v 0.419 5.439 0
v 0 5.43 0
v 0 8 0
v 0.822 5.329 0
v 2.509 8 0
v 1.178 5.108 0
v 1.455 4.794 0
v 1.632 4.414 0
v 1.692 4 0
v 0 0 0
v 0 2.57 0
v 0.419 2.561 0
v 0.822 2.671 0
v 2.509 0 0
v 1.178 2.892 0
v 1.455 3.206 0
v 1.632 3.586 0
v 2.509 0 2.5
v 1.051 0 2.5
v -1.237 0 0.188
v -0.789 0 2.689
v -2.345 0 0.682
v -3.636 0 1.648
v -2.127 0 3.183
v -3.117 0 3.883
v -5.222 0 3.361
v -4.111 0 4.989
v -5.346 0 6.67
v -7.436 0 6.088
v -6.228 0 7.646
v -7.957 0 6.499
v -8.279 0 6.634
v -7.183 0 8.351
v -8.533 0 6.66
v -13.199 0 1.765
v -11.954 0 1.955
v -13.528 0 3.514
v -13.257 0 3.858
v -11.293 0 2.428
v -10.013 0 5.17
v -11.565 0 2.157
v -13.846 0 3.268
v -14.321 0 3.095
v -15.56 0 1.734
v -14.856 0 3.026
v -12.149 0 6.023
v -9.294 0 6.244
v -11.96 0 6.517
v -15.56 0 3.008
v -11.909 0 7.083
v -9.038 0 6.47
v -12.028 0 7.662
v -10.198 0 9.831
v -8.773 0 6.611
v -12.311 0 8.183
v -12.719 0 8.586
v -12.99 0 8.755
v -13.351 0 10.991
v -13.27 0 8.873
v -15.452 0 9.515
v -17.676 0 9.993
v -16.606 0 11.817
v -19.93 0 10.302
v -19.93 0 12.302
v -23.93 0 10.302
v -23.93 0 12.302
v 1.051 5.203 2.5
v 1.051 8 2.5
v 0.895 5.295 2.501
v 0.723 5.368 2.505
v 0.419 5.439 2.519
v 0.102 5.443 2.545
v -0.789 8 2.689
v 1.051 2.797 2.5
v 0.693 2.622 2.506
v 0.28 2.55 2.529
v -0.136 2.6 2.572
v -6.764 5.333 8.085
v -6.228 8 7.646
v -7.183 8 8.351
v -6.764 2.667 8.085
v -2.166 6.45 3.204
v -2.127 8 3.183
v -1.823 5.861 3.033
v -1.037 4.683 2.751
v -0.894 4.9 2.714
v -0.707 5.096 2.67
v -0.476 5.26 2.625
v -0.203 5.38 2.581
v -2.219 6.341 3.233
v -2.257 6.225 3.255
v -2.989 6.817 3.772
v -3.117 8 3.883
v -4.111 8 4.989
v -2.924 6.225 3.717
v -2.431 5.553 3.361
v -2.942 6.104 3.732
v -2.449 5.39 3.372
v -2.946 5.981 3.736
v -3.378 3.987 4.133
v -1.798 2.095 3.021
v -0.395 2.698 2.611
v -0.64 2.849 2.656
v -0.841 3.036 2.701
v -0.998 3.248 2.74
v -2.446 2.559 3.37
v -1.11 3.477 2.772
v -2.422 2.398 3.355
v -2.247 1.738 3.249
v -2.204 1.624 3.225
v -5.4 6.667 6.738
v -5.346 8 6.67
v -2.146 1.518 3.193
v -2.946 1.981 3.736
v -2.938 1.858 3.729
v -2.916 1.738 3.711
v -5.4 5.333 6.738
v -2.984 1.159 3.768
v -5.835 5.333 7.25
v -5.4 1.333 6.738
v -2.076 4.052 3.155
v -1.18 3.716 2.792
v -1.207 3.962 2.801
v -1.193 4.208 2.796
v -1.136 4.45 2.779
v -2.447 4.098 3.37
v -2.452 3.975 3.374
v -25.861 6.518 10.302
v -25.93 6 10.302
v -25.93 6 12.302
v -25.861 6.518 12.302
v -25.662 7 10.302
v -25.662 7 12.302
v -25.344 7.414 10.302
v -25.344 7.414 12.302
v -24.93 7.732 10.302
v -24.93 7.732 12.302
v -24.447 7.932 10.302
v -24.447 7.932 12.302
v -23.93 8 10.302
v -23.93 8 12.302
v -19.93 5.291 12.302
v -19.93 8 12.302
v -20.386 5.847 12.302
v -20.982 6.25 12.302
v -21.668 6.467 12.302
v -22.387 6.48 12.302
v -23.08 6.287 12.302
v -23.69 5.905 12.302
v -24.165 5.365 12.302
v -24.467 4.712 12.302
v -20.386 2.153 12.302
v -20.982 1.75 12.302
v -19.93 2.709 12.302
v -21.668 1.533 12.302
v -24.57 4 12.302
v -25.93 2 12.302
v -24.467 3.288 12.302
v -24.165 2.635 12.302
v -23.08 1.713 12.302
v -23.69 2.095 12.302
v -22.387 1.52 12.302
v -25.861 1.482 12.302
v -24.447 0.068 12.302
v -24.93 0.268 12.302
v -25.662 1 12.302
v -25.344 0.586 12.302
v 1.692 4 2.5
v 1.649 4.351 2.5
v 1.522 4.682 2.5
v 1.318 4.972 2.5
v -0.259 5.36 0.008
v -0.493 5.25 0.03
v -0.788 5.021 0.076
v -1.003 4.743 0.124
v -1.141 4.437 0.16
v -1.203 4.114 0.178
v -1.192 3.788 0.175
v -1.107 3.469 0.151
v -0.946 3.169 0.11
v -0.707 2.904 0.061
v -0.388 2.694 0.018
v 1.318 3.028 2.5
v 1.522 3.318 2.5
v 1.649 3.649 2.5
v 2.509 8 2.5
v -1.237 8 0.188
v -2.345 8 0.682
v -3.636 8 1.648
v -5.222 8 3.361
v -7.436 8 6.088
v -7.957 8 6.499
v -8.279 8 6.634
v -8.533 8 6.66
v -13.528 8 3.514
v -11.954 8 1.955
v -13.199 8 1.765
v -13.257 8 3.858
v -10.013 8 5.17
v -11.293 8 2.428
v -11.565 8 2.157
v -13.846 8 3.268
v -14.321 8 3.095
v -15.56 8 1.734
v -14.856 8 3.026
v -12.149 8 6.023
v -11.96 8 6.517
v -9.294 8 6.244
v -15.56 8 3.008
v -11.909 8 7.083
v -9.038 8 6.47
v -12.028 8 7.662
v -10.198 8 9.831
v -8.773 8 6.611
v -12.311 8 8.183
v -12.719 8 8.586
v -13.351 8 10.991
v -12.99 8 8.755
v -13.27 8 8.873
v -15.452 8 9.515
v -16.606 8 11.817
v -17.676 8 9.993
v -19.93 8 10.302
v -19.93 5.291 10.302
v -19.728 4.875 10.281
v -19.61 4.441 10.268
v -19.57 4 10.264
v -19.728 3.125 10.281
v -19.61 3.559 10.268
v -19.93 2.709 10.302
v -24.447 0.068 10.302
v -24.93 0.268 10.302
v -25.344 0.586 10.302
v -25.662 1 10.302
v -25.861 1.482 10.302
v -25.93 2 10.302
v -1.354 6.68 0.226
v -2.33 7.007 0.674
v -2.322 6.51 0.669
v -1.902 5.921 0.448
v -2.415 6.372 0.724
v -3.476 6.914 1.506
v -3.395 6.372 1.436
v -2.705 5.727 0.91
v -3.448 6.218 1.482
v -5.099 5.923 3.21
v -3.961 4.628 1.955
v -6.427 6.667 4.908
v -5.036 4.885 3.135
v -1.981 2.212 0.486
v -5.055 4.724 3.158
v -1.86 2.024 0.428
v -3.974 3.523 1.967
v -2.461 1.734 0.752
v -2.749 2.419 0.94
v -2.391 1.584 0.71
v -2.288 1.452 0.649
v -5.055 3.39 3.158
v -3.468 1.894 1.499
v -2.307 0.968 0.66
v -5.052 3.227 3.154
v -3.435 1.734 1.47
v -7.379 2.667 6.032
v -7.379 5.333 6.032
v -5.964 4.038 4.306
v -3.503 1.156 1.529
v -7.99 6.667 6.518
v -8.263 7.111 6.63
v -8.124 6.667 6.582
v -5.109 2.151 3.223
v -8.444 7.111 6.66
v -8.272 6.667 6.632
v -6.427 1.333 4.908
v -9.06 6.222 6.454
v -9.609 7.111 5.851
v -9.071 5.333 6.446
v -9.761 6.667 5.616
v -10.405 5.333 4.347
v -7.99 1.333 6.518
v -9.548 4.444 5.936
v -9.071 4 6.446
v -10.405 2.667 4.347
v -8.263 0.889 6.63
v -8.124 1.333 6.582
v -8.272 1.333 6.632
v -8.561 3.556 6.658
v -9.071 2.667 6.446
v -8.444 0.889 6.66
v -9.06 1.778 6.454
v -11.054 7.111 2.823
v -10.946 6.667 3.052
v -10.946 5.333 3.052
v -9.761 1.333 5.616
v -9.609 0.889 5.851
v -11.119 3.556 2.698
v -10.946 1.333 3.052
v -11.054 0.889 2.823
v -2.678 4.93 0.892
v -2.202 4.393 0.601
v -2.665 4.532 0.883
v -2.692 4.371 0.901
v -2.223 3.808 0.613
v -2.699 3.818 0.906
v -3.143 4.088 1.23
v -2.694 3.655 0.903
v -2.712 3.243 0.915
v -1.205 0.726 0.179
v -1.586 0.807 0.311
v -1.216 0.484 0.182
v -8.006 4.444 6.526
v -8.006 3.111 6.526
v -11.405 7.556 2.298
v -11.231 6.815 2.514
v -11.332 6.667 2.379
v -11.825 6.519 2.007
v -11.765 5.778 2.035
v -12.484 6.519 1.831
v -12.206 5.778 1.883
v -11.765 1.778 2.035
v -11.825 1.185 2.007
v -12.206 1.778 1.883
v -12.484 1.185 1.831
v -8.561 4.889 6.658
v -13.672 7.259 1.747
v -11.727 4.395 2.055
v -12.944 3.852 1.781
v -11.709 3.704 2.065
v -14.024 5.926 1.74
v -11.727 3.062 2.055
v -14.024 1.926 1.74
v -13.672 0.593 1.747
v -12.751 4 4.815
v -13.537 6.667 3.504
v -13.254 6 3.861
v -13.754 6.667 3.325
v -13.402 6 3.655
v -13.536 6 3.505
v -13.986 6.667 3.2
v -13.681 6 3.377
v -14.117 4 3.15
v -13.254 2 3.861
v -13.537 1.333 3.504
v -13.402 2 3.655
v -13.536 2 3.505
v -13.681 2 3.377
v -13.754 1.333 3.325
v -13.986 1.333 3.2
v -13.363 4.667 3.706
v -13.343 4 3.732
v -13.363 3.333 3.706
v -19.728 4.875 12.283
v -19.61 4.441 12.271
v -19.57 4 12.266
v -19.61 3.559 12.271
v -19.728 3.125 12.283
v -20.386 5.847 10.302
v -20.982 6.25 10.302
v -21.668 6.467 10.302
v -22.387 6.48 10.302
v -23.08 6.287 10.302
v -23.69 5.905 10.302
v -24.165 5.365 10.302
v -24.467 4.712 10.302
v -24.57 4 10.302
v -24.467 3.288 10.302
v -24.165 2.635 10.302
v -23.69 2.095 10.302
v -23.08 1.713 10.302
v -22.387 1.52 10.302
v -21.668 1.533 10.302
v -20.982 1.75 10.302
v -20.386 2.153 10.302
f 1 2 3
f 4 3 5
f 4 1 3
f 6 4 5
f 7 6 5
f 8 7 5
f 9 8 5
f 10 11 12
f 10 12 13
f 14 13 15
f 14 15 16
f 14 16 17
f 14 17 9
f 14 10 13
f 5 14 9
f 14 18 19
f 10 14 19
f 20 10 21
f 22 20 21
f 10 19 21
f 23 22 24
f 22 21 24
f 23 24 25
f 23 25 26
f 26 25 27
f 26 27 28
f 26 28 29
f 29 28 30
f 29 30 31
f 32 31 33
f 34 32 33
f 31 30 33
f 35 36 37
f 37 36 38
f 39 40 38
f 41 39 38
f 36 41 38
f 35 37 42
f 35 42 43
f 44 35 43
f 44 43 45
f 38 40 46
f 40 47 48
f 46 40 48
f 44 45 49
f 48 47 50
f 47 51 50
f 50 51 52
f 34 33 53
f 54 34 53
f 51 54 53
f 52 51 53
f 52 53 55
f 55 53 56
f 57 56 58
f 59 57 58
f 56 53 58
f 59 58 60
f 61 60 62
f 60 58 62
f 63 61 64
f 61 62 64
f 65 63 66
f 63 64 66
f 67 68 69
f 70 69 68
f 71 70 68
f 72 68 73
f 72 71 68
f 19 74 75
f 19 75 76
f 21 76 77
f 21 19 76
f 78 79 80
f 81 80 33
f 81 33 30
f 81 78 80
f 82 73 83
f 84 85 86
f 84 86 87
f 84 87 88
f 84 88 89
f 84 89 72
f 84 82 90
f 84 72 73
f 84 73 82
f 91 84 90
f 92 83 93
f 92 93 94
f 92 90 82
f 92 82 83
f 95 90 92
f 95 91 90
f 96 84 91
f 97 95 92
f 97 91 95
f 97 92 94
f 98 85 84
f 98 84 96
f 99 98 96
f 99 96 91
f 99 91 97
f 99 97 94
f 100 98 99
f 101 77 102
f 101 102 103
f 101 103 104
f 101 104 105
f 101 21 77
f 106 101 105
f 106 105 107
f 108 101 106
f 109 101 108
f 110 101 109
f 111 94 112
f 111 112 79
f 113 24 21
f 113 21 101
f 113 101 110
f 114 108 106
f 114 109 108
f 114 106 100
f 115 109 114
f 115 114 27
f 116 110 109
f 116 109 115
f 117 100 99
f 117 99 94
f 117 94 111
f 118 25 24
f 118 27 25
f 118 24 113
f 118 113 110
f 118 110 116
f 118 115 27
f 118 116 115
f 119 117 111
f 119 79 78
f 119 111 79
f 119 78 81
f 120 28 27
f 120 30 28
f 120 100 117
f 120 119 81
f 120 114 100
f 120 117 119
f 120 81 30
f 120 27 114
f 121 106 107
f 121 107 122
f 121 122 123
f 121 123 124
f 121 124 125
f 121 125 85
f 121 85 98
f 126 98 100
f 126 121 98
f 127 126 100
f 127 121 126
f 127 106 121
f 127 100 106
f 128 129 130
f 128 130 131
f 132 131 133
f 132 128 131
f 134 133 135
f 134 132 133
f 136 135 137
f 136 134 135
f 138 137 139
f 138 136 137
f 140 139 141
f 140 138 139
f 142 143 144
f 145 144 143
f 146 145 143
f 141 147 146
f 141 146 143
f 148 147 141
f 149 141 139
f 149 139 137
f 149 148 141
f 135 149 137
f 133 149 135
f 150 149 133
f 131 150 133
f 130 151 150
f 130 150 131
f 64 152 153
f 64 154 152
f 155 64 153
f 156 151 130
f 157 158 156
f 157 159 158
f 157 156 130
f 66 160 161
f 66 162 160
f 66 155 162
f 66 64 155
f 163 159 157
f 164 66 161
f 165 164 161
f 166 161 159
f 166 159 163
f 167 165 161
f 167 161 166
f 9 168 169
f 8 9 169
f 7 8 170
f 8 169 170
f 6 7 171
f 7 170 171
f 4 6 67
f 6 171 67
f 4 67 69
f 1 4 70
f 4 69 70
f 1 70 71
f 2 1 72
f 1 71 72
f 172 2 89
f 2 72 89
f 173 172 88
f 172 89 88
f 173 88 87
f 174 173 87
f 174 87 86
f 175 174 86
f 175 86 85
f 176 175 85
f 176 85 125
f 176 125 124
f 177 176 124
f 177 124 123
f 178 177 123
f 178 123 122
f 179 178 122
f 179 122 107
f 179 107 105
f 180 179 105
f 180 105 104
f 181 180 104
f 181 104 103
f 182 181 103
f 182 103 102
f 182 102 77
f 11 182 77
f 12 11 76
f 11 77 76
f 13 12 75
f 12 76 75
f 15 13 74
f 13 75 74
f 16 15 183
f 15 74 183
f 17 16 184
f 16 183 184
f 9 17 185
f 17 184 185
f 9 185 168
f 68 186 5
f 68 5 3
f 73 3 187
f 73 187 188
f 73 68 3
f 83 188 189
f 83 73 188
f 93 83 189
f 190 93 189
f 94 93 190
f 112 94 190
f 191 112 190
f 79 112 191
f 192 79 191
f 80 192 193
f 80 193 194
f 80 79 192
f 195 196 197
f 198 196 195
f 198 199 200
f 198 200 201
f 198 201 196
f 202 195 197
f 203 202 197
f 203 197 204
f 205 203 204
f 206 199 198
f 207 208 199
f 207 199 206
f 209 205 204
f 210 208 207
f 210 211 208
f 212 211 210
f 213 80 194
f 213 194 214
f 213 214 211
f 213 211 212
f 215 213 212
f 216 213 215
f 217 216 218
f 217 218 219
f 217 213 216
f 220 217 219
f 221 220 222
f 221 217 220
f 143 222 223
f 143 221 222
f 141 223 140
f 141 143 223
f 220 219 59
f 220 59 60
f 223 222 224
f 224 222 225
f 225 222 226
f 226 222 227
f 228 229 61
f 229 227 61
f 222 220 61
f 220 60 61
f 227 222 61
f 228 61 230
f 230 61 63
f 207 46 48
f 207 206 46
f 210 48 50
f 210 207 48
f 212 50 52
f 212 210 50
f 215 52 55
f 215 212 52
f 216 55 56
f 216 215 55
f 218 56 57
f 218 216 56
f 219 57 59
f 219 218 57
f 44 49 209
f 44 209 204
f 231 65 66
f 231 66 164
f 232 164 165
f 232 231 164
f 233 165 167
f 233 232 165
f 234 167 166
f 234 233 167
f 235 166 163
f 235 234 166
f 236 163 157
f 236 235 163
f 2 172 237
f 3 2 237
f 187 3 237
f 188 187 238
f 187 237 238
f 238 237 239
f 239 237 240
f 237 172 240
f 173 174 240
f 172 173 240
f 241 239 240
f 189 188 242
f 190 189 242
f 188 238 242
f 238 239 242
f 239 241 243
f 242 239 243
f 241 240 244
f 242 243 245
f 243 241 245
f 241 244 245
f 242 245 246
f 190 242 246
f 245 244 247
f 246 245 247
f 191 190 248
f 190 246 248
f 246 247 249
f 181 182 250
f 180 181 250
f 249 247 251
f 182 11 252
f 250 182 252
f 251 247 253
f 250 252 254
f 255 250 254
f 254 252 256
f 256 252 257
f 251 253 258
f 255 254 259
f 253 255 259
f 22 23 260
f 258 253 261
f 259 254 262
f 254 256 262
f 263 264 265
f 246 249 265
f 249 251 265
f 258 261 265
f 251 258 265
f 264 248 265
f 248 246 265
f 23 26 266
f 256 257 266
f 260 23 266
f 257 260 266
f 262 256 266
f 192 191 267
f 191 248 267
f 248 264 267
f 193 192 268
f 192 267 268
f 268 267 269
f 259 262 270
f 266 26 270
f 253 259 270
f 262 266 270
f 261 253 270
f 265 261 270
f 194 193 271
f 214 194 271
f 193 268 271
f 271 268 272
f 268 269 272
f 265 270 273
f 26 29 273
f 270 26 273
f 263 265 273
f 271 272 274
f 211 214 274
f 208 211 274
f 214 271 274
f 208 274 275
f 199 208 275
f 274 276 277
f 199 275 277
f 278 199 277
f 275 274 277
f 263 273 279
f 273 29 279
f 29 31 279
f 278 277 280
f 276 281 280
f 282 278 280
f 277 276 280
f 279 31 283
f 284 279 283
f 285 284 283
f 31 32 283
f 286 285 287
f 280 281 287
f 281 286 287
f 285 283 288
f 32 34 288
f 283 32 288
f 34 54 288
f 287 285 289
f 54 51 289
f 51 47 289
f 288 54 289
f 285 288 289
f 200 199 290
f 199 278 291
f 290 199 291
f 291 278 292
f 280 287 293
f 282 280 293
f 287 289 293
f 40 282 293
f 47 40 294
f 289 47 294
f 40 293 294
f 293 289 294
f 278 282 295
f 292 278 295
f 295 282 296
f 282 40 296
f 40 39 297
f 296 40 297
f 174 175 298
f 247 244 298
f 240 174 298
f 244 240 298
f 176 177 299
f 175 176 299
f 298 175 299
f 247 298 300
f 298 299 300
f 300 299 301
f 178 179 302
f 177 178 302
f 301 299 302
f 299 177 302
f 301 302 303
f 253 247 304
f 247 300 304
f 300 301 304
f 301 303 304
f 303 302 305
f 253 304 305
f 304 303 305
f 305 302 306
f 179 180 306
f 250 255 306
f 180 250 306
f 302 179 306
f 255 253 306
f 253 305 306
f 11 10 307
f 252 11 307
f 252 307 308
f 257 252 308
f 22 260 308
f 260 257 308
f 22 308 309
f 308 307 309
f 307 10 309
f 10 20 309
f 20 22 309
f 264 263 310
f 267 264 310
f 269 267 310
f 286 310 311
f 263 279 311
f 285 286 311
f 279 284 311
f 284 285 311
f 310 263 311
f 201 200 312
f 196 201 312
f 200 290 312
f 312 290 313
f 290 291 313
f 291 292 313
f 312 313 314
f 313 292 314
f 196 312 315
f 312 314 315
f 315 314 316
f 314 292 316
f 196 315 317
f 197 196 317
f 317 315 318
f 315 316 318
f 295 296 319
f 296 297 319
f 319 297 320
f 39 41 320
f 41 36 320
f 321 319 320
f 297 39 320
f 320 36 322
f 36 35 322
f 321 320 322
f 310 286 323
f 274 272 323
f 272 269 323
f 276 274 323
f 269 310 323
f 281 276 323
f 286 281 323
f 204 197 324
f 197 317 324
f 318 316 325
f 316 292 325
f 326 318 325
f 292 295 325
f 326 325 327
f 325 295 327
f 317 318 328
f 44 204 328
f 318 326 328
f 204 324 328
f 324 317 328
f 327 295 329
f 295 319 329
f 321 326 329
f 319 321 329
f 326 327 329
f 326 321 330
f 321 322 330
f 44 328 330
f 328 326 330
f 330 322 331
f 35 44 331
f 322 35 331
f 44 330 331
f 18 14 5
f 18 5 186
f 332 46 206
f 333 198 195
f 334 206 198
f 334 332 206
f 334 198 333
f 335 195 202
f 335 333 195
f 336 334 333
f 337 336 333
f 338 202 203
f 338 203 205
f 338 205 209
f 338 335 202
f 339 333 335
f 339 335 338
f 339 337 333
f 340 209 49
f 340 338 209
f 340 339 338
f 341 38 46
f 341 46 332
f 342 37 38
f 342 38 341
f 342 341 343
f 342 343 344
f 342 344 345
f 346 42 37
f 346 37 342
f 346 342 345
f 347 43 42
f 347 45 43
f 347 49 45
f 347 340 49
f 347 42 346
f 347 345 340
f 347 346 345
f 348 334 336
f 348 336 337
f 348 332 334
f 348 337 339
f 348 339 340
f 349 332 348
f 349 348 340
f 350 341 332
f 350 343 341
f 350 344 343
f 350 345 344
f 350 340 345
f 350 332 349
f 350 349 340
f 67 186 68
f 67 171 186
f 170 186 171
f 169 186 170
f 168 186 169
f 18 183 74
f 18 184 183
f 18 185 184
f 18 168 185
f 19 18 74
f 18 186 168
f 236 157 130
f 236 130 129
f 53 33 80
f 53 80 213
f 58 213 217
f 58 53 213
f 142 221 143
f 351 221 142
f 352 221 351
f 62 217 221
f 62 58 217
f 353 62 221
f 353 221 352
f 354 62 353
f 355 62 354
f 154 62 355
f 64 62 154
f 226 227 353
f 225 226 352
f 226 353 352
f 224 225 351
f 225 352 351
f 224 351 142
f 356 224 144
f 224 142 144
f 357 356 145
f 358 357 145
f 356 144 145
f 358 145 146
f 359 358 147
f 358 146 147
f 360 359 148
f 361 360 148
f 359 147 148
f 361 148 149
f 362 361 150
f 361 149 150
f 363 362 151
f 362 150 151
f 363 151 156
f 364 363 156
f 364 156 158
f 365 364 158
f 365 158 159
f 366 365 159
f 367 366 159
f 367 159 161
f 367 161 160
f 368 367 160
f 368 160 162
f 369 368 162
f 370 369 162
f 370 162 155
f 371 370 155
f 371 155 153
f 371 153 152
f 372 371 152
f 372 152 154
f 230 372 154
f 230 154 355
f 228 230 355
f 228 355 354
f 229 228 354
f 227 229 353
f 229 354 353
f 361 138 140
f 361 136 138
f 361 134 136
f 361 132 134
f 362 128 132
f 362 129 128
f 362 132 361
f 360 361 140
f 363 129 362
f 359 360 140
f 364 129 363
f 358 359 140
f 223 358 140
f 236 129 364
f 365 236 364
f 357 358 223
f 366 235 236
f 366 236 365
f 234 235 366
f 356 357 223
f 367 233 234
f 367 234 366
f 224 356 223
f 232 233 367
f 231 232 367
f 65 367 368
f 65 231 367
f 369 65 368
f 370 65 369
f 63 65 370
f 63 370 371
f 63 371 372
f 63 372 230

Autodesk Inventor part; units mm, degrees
ref_plane "YZ Plane" through (0, 0, 0) normal (1, 0, 0) x (0, 1, 0)
ref_plane "XZ Plane" through (0, 0, 0) normal (0, 1, 0) x (-1, 0, 0)
ref_plane "XY Plane" through (0, 0, 0) normal (0, 0, 1) x (1, 0, 0)
sketch "Sketch1" plane through (0, 0, 0) normal (0, 1, 0) x (-1, 0, 0)
  line L0 (0, 0) -> (3.0089, 0) construction
  line L1 (3.0089, 0) -> (7.069, 5.8831) construction
  line L2 (7.069, 5.8831) -> (8.9606, 9.5326) construction
  line L3 (8.9606, 9.5326) -> (11.3861, 1.7338) construction
  line L4 (11.3861, 1.7338) -> (15.5604, 1.7338) construction
  spline S0 degree 4 poles (0, 0) (3.0089, 0) (7.069, 5.8831) (8.9606, 9.5326) (11.3861, 1.7338) (11.3861, 1.7338) (15.5604, 1.7338) knots 1 1 1 1 1 2 3 4 4 4 4 4
  line L5 (0, 0) -> (-2.509, 0)
  line L6 (-2.509, 0) -> (-2.509, 2.5)
  line L7 (-2.509, 2.5) -> (-1.0509, 2.5)
  line L8 (-1.0509, 2.5) -> (3.5176, 2.5) construction
  line L9 (3.5176, 2.5) -> (4.4785, 7.5024) construction
  line L10 (4.4785, 7.5024) -> (10.7757, 12.1884) construction
  line L11 (10.7757, 12.1884) -> (13.1491, 3.4753) construction
  line L12 (13.1491, 3.4753) -> (13.5495, 3.0077) construction
  line L13 (13.5495, 3.0077) -> (15.5604, 3.0077) construction
  spline S1 degree 4 poles (-1.0509, 2.5) (3.5176, 2.5) (4.4785, 7.5024) (10.7757, 12.1884) (13.1491, 3.4753) (13.5495, 3.0077) (15.5604, 3.0077) knots 1 1 1 1 1 2 3 4 4 4 4 4
  line L14 (15.5604, 3.0077) -> (15.5604, 1.7338)
  dimension "d0" = 2.5
extrude "Extrusion1" add sketch "Sketch1" along normal blind 8
sketch "Sketch2" plane through (1.0509, 0, 2.5) normal (0, 0, 1) x (1, 0, 0)
  circle A0 centre (-0.8088, 4) radius 1.45
  line L0 (-16.6113, 8) -> (0, 8) projected
  point P0 (-1.0509, 0)
  dimension "d3" = 2.9
  dimension "d14" = 4
extrude "Extrusion2" cut sketch "Sketch2" along normal mid plane 7
sketch "Sketch3" plane through (0, 0, 0) normal (0, -1, 0) x (1, 0, 0)
  line L0 (2.509, 0) -> (0, 0) projected
  line L1 (2.509, 2.5) -> (2.509, 0) projected
  line L2 (1.0509, 2.5) -> (2.509, 2.5) projected
  spline S0 degree 4 poles (-15.5604, 3.0077) (-13.5495, 3.0077) (-13.1491, 3.4753) (-10.7757, 12.1884) (-4.4785, 7.5024) (-3.5176, 2.5) (1.0509, 2.5) knots 0 0 0 0 0 0.333333 0.666667 1 1 1 1 1 projected
  line L3 (-15.5604, 1.7338) -> (-15.5604, 3.0077) projected
  arc A0 (-7.1833, 8.351) -> (-19.9296, 12.3019) centre (-22.9296, -19.9129) ccw
  arc A1 (-10.767, 7.9081) -> (-19.9296, 10.3019) centre (-22.9296, -19.9129) ccw
  line L4 (-19.9296, 12.3019) -> (-19.9296, 10.3019)
  line L5 (-19.9296, 12.3019) -> (-25.9296, 12.3019)
  line L6 (-25.9296, 12.3019) -> (-25.9296, 10.3019)
  line L7 (-25.9296, 10.3019) -> (-19.9296, 10.3019)
  line L8 (-19.9296, 10.3019) -> (-19.9296, 12.3019)
  dimension "d6" = 6
  dimension "d7" = 2
extrude "Extrusion3" add sketch "Sketch3" against normal up to surface (8 mm away)
sketch "Sketch4" plane through (-25.9296, 0, 12.3019) normal (0, 0, 1) x (1, 0, 0)
  arc A0 (0.3271, 6.628) -> (0.3271, 0.742) centre (3.8271, 3.685) ccw projected
  arc A1 (26.9804, 2.7965) -> (26.9804, 5.2035) centre (26.1717, 4) ccw projected
  circle A2 centre (3.8592, 4) radius 2.5
  point P0 (25.9296, 0)
  dimension "d10" = 5
extrude "Extrusion4" cut sketch "Sketch4" against normal blind 10
fillet "Fillet1" radius 2 3 edges at (-25.9296, 0, 11.3019) (-25.9296, 8, 11.3019) (-10.767, 4, 7.9081)
properties part number "30_Cube_Chipadapter_Fluicis_clamp"
